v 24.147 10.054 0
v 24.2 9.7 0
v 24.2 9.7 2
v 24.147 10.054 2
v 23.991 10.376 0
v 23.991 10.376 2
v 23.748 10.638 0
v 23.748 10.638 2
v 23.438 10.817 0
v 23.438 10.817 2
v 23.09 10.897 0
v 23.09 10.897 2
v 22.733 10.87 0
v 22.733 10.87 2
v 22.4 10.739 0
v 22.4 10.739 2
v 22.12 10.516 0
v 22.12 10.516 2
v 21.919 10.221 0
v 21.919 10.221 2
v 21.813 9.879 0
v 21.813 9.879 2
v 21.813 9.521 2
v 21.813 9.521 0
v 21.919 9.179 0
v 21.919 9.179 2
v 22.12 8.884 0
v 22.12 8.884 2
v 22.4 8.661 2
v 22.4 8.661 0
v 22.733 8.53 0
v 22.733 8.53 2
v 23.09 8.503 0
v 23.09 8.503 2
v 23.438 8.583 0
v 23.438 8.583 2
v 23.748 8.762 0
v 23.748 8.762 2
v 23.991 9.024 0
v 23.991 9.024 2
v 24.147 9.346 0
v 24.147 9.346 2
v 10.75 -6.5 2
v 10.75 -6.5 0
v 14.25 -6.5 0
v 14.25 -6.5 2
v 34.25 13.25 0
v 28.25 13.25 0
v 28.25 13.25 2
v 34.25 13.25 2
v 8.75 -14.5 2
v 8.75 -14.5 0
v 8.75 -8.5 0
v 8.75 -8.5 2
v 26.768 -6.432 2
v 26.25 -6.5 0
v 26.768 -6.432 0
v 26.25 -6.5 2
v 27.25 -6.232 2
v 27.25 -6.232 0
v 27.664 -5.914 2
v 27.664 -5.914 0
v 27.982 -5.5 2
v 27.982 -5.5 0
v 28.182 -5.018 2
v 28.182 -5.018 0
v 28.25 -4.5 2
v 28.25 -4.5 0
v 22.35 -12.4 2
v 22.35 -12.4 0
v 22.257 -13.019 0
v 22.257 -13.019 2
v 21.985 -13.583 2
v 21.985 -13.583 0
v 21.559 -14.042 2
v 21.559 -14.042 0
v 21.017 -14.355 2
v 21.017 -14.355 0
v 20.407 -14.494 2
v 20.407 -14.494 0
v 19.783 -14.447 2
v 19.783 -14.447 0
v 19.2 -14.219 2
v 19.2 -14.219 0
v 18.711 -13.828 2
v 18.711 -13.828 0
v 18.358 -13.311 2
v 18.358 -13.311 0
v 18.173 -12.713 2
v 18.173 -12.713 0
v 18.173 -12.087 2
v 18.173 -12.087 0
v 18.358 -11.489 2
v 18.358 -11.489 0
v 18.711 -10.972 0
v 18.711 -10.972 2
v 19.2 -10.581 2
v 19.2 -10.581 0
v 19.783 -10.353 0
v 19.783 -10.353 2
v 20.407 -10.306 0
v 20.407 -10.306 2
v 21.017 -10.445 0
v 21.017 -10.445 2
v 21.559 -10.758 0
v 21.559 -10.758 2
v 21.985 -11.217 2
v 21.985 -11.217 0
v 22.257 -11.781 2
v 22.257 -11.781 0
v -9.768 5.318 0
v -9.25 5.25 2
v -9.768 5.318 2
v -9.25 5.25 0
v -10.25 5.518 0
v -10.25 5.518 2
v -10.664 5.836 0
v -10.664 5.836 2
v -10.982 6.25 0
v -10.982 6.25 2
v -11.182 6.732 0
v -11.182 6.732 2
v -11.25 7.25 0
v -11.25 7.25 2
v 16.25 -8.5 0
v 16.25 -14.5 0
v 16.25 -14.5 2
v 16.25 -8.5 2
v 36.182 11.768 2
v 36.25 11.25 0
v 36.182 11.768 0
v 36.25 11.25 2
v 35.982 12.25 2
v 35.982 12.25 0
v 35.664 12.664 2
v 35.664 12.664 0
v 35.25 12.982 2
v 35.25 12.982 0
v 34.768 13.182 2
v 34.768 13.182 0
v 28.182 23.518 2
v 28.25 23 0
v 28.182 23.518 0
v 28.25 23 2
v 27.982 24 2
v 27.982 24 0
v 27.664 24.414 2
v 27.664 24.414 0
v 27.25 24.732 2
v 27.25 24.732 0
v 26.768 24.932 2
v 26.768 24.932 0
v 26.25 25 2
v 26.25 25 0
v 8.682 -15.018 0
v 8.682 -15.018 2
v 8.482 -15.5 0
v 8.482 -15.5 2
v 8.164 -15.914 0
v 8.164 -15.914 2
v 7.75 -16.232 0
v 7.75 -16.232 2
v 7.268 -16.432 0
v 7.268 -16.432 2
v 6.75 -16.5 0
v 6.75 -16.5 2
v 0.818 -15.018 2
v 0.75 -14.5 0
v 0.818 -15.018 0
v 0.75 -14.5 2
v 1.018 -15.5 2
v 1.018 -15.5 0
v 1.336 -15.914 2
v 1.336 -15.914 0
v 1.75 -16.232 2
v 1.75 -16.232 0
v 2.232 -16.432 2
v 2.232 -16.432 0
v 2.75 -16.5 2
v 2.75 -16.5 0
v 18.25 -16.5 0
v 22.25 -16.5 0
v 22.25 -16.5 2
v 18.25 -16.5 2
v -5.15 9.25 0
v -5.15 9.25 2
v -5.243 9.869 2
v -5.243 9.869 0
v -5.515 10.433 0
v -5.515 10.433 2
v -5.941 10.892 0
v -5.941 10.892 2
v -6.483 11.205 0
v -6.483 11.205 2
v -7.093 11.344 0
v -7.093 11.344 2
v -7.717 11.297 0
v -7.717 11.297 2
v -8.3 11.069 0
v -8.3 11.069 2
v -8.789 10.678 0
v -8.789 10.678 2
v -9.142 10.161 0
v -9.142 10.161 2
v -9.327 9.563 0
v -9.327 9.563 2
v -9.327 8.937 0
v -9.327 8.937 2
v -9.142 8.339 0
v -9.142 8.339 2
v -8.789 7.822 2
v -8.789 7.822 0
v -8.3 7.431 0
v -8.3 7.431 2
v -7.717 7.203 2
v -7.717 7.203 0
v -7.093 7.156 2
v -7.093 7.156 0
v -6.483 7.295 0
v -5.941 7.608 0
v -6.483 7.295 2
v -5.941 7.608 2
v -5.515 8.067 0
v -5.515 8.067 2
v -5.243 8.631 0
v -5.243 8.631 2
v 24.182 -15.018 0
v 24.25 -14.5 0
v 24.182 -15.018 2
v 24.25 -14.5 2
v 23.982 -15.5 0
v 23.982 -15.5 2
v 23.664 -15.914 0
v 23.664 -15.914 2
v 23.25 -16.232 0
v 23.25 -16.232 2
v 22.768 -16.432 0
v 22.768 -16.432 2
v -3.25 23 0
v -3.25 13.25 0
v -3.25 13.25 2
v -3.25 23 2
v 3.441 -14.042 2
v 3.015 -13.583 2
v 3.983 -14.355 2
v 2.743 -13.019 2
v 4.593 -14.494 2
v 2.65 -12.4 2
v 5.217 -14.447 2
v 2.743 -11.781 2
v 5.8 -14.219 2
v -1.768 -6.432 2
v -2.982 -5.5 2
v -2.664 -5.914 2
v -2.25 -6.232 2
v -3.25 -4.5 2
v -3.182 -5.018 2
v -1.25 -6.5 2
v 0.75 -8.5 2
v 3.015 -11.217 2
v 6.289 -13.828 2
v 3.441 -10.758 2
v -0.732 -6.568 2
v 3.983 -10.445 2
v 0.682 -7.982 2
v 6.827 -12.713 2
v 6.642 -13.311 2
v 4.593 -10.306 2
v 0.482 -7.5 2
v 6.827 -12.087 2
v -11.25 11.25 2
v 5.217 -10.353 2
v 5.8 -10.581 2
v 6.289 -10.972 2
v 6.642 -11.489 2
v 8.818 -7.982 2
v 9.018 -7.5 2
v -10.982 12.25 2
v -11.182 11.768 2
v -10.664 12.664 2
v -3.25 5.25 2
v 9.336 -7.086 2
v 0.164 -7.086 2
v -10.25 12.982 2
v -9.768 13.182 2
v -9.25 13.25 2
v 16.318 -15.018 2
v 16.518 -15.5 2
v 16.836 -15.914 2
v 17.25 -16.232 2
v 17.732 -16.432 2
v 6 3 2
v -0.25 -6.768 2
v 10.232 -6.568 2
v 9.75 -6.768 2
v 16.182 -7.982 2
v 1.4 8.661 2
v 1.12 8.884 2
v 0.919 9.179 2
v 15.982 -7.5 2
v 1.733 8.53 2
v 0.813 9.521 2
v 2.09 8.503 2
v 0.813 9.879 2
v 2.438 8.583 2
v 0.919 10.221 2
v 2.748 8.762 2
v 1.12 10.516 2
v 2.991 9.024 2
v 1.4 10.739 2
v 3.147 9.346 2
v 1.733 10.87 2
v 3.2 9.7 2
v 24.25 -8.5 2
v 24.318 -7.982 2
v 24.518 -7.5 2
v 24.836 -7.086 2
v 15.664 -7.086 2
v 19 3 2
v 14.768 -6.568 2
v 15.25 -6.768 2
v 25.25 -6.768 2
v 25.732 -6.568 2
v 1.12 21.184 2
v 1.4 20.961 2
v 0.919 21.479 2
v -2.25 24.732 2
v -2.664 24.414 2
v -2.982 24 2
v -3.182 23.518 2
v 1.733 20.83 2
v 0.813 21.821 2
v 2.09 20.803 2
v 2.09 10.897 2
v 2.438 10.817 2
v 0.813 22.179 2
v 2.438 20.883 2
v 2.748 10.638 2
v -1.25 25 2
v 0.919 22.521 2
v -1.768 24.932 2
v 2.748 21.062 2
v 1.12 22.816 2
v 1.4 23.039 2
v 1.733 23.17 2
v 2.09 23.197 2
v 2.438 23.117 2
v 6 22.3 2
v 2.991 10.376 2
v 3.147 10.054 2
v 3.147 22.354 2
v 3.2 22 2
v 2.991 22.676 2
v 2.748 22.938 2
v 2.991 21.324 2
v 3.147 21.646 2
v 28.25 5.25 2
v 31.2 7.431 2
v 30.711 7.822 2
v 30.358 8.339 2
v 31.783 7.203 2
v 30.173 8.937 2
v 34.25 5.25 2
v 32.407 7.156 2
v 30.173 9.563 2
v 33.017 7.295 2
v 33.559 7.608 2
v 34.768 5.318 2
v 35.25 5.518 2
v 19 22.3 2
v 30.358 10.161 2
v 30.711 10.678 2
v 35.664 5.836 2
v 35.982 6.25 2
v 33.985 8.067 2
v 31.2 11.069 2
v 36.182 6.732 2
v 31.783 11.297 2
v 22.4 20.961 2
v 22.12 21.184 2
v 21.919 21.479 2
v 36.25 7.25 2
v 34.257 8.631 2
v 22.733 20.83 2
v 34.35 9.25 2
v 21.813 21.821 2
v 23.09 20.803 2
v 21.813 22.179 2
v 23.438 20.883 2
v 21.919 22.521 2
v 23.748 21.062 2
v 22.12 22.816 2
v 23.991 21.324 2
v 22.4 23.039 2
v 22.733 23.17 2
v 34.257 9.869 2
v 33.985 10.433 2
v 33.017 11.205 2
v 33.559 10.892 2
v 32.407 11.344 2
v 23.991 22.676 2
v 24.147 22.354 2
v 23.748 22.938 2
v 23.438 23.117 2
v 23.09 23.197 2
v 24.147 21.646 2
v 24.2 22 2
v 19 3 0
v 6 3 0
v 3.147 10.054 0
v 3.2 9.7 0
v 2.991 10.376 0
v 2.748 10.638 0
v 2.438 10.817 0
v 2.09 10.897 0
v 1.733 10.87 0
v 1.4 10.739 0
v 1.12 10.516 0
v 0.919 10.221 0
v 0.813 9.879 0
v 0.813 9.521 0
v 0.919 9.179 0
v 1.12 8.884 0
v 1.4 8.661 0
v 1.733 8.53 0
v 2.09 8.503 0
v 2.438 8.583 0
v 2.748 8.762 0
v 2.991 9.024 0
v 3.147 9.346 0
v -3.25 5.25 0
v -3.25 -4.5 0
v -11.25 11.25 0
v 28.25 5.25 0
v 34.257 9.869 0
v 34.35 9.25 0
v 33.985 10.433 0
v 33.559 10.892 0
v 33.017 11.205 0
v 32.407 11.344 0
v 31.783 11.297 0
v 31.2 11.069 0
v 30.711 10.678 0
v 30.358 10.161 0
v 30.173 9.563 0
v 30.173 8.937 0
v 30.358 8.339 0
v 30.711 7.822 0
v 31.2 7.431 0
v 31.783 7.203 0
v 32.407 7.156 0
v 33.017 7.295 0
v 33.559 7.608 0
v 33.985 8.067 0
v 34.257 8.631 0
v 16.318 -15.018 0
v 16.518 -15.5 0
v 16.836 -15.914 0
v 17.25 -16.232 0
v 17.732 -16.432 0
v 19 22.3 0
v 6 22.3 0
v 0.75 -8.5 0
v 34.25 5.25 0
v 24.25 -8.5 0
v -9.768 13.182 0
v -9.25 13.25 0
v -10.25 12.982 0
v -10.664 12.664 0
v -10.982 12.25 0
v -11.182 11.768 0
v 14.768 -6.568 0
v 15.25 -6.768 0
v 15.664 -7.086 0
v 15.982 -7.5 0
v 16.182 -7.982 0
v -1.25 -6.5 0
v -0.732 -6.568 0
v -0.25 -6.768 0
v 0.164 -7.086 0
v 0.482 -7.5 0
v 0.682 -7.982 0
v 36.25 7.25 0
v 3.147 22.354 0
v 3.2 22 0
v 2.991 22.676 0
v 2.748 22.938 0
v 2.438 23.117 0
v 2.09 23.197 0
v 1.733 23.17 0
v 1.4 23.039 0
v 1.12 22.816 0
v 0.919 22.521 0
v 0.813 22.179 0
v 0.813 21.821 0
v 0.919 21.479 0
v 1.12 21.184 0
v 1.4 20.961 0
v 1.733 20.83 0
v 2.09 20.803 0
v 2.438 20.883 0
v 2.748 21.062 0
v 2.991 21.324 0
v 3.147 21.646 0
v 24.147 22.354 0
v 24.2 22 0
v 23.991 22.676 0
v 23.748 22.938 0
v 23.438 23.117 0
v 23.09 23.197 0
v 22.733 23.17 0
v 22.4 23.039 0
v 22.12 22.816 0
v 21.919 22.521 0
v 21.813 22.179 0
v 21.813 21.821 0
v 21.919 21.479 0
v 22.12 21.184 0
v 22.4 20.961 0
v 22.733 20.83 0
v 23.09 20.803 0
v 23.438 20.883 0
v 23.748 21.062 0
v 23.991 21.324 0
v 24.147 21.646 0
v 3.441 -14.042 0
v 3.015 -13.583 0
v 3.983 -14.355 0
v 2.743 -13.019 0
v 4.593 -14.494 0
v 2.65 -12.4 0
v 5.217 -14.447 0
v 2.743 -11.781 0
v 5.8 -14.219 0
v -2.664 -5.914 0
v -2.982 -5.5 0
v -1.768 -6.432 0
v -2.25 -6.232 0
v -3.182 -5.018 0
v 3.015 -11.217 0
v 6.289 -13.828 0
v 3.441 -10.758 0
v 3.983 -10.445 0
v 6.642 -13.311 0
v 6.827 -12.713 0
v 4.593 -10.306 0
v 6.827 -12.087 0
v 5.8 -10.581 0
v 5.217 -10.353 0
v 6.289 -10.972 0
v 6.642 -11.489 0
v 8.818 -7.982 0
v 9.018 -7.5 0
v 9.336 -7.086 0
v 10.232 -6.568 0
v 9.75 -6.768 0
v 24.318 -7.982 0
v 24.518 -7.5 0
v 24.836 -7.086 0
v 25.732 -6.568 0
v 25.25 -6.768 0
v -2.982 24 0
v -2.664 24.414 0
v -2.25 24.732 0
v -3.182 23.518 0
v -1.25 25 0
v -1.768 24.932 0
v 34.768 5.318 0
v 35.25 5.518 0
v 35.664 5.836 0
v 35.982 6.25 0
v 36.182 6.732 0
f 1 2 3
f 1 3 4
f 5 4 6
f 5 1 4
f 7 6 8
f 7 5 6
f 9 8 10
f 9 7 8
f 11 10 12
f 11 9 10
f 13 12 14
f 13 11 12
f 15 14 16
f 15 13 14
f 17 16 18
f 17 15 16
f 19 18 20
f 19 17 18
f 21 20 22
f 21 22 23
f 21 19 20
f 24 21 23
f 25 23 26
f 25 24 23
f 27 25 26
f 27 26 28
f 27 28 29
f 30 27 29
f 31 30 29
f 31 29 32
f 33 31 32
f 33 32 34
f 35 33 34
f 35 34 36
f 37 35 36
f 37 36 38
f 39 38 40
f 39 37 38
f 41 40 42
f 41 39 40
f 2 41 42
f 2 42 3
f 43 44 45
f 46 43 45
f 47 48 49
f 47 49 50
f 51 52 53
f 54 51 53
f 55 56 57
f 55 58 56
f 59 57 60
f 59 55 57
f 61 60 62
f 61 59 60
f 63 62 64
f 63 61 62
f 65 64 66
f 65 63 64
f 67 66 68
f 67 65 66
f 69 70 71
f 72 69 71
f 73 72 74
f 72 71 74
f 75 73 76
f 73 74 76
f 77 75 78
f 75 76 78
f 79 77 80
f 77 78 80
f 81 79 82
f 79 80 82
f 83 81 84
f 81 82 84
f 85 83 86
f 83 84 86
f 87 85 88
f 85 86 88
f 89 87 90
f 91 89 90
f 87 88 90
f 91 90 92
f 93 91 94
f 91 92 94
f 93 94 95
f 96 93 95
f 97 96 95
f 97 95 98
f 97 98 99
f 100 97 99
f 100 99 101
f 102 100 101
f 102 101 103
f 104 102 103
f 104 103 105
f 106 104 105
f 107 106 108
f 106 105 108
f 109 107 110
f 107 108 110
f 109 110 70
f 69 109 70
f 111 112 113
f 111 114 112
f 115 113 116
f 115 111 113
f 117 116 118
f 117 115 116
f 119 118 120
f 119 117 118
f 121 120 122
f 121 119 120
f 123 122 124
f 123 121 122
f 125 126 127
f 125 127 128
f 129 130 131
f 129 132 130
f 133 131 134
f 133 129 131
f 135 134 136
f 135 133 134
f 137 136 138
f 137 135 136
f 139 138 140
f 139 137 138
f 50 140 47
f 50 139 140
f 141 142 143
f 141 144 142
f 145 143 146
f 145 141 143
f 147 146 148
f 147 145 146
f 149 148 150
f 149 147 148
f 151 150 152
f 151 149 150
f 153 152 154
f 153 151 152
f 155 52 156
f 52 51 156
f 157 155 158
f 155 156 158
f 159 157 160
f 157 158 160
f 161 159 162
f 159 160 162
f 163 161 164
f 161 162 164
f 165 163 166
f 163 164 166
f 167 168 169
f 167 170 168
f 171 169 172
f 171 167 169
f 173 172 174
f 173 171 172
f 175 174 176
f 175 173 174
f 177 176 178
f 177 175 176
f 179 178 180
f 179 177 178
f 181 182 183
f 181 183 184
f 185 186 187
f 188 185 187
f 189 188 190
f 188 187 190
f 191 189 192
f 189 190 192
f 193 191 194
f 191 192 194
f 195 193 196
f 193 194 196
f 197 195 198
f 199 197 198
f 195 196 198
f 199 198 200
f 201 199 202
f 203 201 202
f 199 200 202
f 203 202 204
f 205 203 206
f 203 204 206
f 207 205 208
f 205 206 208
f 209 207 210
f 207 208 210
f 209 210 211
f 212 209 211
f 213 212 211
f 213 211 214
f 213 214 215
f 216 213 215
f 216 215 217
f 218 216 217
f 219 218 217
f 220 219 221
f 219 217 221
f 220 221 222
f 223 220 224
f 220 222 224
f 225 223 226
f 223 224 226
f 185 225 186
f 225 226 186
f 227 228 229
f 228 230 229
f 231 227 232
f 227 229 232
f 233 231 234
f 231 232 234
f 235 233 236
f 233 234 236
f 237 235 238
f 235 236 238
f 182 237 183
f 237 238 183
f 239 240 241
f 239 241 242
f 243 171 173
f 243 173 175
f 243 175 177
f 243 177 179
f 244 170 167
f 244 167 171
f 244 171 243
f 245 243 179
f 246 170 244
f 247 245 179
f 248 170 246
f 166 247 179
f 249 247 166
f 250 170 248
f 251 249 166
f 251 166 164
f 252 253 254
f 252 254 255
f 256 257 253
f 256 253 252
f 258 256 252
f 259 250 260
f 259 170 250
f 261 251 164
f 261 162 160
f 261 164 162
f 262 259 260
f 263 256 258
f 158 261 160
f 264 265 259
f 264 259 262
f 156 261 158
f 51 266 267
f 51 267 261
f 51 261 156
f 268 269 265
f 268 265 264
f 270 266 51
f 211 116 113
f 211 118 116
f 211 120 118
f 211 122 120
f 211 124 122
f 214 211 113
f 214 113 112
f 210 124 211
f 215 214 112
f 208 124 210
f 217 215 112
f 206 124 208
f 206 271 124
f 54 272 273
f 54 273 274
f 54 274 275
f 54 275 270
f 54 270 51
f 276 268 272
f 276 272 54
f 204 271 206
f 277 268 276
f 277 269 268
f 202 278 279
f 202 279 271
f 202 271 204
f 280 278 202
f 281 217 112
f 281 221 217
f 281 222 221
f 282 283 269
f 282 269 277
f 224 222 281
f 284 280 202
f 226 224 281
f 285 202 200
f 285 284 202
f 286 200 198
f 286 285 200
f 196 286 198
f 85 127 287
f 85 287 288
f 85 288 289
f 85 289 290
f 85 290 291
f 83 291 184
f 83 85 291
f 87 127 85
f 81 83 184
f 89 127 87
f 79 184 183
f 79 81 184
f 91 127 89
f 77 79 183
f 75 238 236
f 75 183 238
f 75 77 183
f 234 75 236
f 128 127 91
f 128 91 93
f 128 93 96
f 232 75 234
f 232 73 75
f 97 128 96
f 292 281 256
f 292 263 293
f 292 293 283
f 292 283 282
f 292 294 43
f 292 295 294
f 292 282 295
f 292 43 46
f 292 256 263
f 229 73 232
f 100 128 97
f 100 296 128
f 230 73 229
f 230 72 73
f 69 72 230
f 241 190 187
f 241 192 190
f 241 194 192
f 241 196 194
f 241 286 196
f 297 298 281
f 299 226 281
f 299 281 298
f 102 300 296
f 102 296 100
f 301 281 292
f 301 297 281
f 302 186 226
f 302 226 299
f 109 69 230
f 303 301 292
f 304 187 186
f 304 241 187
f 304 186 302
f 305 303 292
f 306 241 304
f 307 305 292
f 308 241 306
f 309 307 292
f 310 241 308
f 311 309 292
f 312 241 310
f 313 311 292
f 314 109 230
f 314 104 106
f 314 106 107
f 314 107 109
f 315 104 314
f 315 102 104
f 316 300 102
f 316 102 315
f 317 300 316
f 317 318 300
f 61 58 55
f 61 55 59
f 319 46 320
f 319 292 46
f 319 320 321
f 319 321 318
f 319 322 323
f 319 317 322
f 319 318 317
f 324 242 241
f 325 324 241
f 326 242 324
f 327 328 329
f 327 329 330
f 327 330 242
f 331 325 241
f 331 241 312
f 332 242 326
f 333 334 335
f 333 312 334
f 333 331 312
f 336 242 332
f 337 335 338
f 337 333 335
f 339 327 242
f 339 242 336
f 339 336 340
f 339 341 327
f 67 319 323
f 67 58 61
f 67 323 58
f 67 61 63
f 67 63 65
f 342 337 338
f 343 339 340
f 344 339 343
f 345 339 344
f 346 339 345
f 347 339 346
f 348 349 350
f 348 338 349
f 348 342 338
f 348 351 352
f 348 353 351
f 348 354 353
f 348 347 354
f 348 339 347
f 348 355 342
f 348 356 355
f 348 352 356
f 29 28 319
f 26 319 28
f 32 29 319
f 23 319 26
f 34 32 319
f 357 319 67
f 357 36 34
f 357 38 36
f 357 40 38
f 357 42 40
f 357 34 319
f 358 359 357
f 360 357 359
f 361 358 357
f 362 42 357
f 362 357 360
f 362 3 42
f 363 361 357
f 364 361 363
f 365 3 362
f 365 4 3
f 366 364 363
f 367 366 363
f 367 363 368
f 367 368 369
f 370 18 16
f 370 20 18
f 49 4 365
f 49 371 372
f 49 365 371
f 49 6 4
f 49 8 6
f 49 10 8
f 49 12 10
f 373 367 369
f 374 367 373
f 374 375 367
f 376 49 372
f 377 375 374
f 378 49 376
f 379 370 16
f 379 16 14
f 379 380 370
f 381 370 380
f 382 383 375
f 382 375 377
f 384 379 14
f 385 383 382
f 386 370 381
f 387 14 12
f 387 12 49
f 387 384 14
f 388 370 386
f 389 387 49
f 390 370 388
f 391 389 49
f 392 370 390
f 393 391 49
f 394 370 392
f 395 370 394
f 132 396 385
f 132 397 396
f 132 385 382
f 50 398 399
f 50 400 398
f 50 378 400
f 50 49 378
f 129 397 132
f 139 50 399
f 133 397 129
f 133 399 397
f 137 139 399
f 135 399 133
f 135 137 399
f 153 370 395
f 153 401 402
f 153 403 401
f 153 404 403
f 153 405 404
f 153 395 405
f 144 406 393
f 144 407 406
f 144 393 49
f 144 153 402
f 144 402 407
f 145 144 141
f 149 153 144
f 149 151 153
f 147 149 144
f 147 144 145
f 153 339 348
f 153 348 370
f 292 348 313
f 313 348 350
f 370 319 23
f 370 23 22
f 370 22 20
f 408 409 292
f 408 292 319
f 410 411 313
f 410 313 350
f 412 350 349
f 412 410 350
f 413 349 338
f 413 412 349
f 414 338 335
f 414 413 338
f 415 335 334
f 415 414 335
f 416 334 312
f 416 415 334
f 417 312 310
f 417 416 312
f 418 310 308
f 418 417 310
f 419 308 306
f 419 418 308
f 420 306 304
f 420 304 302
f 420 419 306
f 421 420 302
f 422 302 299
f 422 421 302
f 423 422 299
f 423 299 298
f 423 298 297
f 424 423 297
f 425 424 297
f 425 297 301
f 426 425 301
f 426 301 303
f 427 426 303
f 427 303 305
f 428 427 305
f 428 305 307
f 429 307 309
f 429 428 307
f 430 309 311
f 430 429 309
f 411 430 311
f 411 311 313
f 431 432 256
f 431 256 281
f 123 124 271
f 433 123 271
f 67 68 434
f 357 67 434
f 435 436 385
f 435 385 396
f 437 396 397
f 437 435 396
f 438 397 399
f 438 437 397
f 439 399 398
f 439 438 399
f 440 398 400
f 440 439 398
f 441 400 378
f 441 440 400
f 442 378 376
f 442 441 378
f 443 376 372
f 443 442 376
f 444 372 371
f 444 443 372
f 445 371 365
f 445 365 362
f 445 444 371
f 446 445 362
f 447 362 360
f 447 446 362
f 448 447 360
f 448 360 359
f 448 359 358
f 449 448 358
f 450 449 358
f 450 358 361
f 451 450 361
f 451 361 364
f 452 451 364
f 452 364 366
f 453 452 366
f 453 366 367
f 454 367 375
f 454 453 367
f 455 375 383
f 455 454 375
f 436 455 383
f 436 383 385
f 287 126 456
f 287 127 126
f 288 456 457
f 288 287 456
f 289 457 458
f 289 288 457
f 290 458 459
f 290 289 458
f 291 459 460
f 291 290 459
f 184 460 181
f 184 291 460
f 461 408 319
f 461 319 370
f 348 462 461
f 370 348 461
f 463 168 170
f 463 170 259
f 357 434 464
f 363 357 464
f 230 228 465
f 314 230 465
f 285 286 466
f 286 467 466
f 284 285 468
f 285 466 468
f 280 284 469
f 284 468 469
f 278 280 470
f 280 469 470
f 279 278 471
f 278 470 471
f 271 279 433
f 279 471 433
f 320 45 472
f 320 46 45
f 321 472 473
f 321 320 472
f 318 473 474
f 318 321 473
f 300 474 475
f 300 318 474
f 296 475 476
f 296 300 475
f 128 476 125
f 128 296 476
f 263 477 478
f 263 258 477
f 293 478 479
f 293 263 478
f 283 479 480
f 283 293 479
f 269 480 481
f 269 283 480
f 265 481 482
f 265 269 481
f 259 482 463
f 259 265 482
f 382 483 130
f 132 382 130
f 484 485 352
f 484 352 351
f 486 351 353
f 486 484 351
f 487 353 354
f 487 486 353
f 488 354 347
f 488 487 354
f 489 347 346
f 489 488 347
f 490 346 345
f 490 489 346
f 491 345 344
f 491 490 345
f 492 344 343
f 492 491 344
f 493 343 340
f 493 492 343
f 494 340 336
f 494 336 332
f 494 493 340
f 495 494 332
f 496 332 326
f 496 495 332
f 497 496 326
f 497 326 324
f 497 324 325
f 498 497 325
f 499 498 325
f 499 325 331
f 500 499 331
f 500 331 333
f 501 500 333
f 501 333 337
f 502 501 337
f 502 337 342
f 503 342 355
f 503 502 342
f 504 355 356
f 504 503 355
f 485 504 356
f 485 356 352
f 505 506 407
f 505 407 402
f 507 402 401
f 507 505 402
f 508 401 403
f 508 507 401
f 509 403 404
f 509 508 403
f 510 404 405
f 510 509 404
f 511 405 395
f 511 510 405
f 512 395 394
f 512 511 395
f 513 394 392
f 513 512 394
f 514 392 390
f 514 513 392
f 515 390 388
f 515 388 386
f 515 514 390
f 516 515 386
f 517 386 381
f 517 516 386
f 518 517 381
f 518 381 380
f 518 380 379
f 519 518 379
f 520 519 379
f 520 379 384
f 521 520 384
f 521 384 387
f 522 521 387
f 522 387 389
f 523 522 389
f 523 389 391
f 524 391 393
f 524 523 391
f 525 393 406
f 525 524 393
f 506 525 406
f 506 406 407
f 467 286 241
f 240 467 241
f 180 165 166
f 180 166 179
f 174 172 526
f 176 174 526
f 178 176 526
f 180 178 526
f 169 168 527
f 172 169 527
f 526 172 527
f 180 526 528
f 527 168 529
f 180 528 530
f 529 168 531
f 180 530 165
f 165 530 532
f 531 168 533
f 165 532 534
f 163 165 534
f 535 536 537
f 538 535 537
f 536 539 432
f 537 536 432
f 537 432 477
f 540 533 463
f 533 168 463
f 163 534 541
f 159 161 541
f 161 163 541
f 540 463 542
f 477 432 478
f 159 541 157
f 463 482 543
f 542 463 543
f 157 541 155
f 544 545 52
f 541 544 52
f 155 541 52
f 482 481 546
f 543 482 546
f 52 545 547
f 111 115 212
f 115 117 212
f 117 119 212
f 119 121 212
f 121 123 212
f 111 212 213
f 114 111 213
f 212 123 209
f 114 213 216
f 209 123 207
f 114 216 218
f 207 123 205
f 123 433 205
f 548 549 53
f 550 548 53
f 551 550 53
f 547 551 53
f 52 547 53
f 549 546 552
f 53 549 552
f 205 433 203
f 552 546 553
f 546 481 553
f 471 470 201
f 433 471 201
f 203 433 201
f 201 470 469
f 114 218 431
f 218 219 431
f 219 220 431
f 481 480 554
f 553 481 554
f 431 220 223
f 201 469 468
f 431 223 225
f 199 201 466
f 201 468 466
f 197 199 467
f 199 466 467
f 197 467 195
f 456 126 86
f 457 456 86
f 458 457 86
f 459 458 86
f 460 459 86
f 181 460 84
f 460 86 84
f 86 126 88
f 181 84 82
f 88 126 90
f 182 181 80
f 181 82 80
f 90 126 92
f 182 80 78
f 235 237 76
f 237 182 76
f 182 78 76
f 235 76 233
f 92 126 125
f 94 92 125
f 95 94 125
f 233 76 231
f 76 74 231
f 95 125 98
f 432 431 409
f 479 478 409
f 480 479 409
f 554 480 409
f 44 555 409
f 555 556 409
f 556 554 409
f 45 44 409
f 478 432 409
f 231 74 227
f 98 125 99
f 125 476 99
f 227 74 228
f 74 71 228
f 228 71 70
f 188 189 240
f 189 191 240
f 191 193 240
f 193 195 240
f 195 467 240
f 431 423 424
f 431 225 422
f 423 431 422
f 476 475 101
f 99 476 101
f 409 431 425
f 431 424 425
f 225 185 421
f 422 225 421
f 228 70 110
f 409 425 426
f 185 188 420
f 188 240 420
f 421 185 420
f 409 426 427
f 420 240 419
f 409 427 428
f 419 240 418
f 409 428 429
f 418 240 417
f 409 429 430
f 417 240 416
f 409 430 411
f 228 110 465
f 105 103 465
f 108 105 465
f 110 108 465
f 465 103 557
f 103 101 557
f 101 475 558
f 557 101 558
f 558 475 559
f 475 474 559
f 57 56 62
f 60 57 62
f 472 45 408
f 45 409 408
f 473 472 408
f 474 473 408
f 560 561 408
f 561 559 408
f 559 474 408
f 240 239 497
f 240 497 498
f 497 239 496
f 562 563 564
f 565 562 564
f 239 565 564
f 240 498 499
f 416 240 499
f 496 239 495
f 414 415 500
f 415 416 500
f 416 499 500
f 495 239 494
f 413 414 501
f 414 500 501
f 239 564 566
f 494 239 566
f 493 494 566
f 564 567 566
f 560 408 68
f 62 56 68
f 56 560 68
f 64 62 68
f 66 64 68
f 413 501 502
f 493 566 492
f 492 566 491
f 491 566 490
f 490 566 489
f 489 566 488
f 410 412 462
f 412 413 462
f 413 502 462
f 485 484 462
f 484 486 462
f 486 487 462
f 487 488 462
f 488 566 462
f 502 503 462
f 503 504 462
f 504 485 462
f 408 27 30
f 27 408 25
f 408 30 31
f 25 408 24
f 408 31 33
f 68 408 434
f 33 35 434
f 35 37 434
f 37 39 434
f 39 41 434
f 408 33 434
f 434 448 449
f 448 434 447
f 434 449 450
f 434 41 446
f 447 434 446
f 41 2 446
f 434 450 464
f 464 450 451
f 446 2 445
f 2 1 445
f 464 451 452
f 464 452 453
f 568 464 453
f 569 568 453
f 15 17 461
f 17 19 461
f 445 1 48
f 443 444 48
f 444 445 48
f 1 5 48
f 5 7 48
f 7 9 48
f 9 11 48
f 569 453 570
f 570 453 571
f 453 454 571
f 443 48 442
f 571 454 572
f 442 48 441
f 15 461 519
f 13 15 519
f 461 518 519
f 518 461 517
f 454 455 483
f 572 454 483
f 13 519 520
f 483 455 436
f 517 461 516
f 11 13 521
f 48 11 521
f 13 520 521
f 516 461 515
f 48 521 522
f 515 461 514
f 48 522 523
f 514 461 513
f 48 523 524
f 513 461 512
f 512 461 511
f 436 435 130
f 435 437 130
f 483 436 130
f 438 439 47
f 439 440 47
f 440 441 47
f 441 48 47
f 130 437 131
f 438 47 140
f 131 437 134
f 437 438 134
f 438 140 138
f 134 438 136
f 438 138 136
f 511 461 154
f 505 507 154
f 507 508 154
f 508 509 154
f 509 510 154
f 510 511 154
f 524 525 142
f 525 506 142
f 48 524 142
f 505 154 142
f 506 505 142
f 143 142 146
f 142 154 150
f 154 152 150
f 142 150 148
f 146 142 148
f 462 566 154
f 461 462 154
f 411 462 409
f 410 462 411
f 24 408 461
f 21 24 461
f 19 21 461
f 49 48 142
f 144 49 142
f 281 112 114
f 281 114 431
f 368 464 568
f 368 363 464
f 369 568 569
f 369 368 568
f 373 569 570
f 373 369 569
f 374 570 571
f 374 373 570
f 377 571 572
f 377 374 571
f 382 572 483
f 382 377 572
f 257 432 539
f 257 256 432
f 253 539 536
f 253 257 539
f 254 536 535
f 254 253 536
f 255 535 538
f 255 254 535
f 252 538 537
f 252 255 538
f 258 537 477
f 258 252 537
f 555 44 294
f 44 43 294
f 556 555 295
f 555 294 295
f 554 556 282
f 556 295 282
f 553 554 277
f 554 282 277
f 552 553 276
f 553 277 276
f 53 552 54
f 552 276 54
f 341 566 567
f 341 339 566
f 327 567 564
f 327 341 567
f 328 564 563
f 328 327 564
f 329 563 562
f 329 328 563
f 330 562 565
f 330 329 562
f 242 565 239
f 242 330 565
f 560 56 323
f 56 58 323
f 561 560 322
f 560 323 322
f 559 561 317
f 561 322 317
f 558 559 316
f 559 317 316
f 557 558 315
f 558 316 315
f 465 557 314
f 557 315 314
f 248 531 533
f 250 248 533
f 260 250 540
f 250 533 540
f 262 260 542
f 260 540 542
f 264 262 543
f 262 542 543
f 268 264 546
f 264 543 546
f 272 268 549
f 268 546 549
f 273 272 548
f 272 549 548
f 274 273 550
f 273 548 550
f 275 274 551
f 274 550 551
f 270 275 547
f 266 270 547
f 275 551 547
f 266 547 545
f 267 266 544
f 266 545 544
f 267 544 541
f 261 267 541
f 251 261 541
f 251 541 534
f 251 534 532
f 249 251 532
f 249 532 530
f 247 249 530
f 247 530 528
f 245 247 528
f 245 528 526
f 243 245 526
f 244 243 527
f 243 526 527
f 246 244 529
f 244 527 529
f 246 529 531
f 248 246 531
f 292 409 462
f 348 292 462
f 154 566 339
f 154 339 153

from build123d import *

# Parameters (mm, degrees)
SKETCH1_W             = 31.5
SKETCH1_H             = 31.5
SKETCH1_R             = 1.2
SKETCH1_W_2           = 13
SKETCH1_H_2           = 19.3
BOSS_EXTRUDE1_DEPTH   = 2
SKETCH4_W             = 8
SKETCH4_H             = 8
SKETCH4_R             = 2.1
BOSS_EXTRUDE3_DEPTH   = 2
CIRPATTERN2_OUTLINE_W = 8
CIRPATTERN2_OUTLINE_H = 8
CIRPATTERN2_OUTLINE_R = 2.1
CIRPATTERN2_DEPTH     = 2
SKETCH5_W             = 8
SKETCH5_H             = 10
SKETCH5_R             = 2.1
BOSS_EXTRUDE4_DEPTH   = 2
FILLET1_R             = 2


# Read off the part's stored shape, not the designer's step: CirPattern2
with BuildPart() as part:
    # Sketch1 → Boss-Extrude1 (new body)
    with BuildSketch(Plane.XY):
        with Locations((12.5, 9.25)):
            Rectangle(SKETCH1_W, SKETCH1_H)
        with Locations((2, 22)):
            Circle(SKETCH1_R, mode=Mode.SUBTRACT)
        with Locations((23, 22)):
            Circle(SKETCH1_R, mode=Mode.SUBTRACT)
        with Locations((23, 9.7)):
            Circle(SKETCH1_R, mode=Mode.SUBTRACT)
        with Locations((2, 9.7)):
            Circle(SKETCH1_R, mode=Mode.SUBTRACT)
        with Locations((12.5, 12.65)):
            Rectangle(SKETCH1_W_2, SKETCH1_H_2, mode=Mode.SUBTRACT)
    extrude(amount=BOSS_EXTRUDE1_DEPTH)

    # Sketch4 → Boss-Extrude3 (add)
    with BuildSketch(Plane.XY.offset(2)):
        with Locations((-7.25, 9.25)):
            Rectangle(SKETCH4_W, SKETCH4_H)
        with Locations((-7.25, 9.25)):
            Circle(SKETCH4_R, mode=Mode.SUBTRACT)
    extrude(amount=-BOSS_EXTRUDE3_DEPTH)

    # CirPattern2 outline → CirPattern2 (add)
    with BuildSketch(Plane.XY):
        with Locations((32.25, 9.25)):
            Rectangle(CIRPATTERN2_OUTLINE_W, CIRPATTERN2_OUTLINE_H)
        with Locations((32.25, 9.25)):
            Circle(CIRPATTERN2_OUTLINE_R, mode=Mode.SUBTRACT)
    extrude(amount=CIRPATTERN2_DEPTH)

    # Sketch5 → Boss-Extrude4 (add)
    # profile 1 of 2: a face of its own
    with BuildSketch(Plane(origin=(0, 0, 0), x_dir=(-1, 0, 0), z_dir=(0, 0, -1))):
        with Locations((-4.75, -11.5)):
            Rectangle(SKETCH5_W, SKETCH5_H)
        with Locations((-4.75, -12.4)):
            Circle(SKETCH5_R, mode=Mode.SUBTRACT)
    # profile 2 of 2: a face of its own
    with BuildSketch(Plane(origin=(0, 0, 0), x_dir=(-1, 0, 0), z_dir=(0, 0, -1))):
        with Locations((-20.25, -11.5)):
            Rectangle(SKETCH5_W, SKETCH5_H)
        with Locations(Location((-20.25, -12.4, 0), (0, 0, 180))):
            Circle(SKETCH5_R, mode=Mode.SUBTRACT)
    extrude(amount=-BOSS_EXTRUDE4_DEPTH)

    # Fillet1
    fillet1_edges = [part.edges().sort_by_distance(p)[0] for p in [
        (-11.25, 13.25, 1),
        (-11.25, 5.25, 1),
        (36.25, 5.25, 1),
        (36.25, 13.25, 1),
        (0.75, -6.5, 1),
        (0.75, -16.5, 1),
        (8.75, -16.5, 1),
        (8.75, -6.5, 1),
        (-3.25, 25, 1),
        (28.25, 25, 1),
        (28.25, -6.5, 1),
        (-3.25, -6.5, 1),
        (24.25, -16.5, 1),
        (24.25, -6.5, 1),
        (16.25, -6.5, 1),
        (16.25, -16.5, 1),
    ]]
    fillet(fillet1_edges, radius=FILLET1_R - 0.0001)  # a hair under: the kernel refuses the full size


solid = part.part
